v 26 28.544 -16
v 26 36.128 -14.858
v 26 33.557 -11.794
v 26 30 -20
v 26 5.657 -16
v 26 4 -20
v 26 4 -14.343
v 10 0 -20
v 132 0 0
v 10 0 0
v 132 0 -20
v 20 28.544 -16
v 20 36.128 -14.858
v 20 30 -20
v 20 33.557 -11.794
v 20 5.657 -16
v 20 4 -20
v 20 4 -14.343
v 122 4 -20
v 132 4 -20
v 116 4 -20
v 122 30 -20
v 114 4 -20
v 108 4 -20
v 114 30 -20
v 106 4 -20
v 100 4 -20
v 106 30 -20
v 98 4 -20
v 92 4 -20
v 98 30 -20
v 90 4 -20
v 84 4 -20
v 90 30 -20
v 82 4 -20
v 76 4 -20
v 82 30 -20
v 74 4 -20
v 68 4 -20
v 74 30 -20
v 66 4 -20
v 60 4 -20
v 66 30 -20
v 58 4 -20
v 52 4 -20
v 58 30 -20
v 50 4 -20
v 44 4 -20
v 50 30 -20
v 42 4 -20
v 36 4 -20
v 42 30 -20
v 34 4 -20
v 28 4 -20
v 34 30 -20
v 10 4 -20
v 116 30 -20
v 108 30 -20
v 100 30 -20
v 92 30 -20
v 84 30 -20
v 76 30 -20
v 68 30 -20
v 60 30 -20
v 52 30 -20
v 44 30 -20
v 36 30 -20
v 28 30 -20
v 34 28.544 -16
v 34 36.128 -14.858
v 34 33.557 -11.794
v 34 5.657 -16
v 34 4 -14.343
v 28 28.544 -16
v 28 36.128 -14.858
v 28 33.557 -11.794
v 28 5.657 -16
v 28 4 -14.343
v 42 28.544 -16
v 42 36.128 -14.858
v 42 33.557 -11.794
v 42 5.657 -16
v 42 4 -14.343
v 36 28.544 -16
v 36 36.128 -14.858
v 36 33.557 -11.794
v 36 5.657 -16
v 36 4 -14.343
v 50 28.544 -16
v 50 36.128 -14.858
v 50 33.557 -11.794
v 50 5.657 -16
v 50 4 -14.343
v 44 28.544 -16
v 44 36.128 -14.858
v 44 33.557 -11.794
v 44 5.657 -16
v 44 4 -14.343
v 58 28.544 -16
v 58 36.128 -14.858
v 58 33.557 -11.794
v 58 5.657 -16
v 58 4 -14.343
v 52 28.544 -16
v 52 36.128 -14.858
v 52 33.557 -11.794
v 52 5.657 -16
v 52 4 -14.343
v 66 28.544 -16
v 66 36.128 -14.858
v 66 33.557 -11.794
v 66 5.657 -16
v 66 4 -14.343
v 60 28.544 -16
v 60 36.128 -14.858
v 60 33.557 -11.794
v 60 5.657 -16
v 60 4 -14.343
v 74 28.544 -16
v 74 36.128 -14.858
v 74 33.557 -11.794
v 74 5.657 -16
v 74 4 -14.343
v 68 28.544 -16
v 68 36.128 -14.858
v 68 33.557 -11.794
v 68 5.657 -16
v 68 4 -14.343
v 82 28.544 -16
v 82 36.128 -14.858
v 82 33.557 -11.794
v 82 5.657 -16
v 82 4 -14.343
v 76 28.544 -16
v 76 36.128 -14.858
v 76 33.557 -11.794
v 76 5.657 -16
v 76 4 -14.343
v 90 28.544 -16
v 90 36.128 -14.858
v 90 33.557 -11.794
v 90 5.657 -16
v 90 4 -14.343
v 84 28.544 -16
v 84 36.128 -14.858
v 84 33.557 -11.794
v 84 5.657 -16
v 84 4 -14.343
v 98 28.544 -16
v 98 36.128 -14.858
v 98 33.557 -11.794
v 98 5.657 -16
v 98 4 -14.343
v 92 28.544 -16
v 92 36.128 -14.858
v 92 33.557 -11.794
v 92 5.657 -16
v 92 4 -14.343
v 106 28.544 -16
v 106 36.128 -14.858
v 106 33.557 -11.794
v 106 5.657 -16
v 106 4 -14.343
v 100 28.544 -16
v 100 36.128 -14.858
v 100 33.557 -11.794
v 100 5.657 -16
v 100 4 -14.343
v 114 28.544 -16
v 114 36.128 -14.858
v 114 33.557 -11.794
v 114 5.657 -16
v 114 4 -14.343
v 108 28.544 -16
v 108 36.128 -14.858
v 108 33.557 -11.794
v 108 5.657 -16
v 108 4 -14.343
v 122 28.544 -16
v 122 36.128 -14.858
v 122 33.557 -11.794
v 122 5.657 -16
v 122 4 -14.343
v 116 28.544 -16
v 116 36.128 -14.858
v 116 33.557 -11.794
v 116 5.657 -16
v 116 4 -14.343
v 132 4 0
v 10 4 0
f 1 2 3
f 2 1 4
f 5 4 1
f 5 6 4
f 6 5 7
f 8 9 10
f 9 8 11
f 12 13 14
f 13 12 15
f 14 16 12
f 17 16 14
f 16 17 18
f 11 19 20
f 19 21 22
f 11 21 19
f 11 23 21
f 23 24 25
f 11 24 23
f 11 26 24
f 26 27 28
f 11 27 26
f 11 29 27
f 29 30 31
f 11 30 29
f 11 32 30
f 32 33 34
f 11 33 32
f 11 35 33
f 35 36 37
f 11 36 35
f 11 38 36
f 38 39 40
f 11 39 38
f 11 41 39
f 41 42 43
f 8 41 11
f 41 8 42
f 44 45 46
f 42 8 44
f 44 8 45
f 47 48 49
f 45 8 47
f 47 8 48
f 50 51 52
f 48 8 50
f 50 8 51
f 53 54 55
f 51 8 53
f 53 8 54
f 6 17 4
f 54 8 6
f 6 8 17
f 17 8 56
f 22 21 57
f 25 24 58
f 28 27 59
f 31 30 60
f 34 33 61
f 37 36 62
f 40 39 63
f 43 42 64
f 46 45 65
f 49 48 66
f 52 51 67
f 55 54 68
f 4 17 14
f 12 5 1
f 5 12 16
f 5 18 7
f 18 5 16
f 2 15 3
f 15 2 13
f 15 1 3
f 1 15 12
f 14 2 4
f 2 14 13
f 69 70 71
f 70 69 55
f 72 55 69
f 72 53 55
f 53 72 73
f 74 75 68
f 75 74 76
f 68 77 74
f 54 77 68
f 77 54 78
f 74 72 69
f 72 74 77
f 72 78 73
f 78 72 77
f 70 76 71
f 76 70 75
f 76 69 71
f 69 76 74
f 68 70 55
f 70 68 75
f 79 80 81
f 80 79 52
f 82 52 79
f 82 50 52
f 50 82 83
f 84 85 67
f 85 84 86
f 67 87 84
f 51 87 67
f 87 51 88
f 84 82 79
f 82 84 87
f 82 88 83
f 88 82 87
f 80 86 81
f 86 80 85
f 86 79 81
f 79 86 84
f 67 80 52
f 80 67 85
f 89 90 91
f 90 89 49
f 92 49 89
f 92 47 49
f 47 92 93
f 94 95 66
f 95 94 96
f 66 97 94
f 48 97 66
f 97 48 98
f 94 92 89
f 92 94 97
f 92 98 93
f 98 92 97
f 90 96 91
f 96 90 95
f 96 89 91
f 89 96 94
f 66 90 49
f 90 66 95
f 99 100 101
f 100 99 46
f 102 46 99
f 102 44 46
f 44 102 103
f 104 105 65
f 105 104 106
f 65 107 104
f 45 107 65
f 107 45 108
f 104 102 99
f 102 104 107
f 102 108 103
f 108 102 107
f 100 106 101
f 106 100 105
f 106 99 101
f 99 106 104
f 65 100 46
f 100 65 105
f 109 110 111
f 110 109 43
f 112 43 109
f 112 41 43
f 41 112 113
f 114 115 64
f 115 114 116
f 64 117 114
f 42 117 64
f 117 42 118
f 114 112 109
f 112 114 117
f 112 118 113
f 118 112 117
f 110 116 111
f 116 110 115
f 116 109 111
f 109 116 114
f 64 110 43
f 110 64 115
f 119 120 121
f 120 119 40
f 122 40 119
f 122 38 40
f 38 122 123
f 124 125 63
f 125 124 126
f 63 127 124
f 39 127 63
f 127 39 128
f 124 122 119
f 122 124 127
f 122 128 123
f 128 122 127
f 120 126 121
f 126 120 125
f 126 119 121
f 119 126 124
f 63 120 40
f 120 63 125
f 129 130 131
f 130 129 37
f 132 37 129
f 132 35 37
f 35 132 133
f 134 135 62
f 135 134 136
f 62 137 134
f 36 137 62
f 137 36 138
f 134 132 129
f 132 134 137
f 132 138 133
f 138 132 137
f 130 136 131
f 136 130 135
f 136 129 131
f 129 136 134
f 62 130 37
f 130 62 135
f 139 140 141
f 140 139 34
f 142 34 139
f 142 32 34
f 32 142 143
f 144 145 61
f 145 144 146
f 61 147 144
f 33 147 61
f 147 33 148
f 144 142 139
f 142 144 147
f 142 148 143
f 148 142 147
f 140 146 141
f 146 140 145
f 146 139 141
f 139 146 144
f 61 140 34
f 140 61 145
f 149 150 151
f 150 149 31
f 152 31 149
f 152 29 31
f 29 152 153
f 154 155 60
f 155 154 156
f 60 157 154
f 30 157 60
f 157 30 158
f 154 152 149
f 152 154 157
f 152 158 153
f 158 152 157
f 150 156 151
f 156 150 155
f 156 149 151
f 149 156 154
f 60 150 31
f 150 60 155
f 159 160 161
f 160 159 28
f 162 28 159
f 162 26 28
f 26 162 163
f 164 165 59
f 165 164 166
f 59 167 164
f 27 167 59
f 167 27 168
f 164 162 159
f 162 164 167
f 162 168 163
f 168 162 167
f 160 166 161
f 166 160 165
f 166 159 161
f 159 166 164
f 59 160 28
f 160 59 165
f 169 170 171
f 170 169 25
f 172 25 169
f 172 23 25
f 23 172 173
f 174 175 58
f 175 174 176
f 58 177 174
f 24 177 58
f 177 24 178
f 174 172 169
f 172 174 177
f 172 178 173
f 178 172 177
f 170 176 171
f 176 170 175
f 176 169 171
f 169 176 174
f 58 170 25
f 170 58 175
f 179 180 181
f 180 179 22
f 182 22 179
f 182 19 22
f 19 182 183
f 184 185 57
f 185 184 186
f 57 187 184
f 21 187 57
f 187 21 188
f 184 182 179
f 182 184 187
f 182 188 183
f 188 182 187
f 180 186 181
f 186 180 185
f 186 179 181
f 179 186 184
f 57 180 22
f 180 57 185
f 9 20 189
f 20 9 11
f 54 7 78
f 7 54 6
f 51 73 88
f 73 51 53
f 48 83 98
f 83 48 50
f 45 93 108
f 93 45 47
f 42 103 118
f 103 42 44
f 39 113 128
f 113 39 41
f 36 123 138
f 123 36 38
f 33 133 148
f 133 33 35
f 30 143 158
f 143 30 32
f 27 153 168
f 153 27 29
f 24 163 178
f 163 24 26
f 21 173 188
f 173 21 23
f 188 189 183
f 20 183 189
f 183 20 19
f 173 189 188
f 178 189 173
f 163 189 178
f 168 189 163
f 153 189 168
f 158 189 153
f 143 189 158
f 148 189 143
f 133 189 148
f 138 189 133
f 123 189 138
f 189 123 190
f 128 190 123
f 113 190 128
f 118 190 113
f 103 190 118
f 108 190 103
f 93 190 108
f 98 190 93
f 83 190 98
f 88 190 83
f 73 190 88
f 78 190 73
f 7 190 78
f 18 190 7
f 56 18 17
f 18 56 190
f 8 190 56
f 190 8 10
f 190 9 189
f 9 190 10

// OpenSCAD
// This script creates a wire rack with a variable number of tines

$fn = 32+1-1;	// Dummy math to avoid showing in customizer.

// Number of tines
N = 13;			// [2:20]
tine_width = 6;
tine_height = 4;
tine_length = 30;
tine_pitch = 8;

base_height = 20;
base_width = base_height*2 + (N-1)*(tine_pitch) + tine_width;
base_thickness = 4;

echo("<b>Base width [mm]:", base_width);

countersink_diameter = 10;
hole_diameter = 3;

rotate([-90,0,0])
union() {
difference()
{
	// Baseplate
	union()
	{
		translate([base_height/2,0,0]) cube([base_width-base_height,base_height,base_thickness]);
		//translate([base_height/2,base_height/2,0]) cylinder(base_thickness,base_height/2,base_height/2);
		//translate([base_width-base_height/2,base_height/2,0]) cylinder(base_thickness,base_height/2,base_height/2);		
	}

	// Screw holes
	*for (i = [0:1])
	{
		translate([base_height/2+(base_width-base_height)*i,base_height/2,4])
		{
			union()
			{
				// Countersink
				cylinder(base_thickness,countersink_diameter/2,countersink_diameter/2,true);

				// Screw hole
				cylinder(base_thickness*3,hole_diameter/2,hole_diameter/2,true);
			}

		}
	}

	// Text
	/*translate([base_width/2-10.75*2.4,2,base_thickness-1])
		scale([12,12,2])
			import("WireRackText.stl");*/
}

// Tines
for (i = [0:(N-1)])
{
	// Tine
	translate([base_height + tine_pitch*i, base_height - tine_height, 0])
		cube([tine_width,tine_height,tine_length]);

	// Tine support
	translate([base_height + tine_pitch*i, base_height-tine_height, 0])
		rotate([45, 0, 0])
			cube([tine_width, tine_height, tine_height]);

	// Upturned tine end
	translate([base_height+tine_pitch*i,base_height,tine_length])
		rotate([40,0,0])
			translate([0,-tine_height,0])
				cube([tine_width,tine_height,tine_height*2]);
}


}
